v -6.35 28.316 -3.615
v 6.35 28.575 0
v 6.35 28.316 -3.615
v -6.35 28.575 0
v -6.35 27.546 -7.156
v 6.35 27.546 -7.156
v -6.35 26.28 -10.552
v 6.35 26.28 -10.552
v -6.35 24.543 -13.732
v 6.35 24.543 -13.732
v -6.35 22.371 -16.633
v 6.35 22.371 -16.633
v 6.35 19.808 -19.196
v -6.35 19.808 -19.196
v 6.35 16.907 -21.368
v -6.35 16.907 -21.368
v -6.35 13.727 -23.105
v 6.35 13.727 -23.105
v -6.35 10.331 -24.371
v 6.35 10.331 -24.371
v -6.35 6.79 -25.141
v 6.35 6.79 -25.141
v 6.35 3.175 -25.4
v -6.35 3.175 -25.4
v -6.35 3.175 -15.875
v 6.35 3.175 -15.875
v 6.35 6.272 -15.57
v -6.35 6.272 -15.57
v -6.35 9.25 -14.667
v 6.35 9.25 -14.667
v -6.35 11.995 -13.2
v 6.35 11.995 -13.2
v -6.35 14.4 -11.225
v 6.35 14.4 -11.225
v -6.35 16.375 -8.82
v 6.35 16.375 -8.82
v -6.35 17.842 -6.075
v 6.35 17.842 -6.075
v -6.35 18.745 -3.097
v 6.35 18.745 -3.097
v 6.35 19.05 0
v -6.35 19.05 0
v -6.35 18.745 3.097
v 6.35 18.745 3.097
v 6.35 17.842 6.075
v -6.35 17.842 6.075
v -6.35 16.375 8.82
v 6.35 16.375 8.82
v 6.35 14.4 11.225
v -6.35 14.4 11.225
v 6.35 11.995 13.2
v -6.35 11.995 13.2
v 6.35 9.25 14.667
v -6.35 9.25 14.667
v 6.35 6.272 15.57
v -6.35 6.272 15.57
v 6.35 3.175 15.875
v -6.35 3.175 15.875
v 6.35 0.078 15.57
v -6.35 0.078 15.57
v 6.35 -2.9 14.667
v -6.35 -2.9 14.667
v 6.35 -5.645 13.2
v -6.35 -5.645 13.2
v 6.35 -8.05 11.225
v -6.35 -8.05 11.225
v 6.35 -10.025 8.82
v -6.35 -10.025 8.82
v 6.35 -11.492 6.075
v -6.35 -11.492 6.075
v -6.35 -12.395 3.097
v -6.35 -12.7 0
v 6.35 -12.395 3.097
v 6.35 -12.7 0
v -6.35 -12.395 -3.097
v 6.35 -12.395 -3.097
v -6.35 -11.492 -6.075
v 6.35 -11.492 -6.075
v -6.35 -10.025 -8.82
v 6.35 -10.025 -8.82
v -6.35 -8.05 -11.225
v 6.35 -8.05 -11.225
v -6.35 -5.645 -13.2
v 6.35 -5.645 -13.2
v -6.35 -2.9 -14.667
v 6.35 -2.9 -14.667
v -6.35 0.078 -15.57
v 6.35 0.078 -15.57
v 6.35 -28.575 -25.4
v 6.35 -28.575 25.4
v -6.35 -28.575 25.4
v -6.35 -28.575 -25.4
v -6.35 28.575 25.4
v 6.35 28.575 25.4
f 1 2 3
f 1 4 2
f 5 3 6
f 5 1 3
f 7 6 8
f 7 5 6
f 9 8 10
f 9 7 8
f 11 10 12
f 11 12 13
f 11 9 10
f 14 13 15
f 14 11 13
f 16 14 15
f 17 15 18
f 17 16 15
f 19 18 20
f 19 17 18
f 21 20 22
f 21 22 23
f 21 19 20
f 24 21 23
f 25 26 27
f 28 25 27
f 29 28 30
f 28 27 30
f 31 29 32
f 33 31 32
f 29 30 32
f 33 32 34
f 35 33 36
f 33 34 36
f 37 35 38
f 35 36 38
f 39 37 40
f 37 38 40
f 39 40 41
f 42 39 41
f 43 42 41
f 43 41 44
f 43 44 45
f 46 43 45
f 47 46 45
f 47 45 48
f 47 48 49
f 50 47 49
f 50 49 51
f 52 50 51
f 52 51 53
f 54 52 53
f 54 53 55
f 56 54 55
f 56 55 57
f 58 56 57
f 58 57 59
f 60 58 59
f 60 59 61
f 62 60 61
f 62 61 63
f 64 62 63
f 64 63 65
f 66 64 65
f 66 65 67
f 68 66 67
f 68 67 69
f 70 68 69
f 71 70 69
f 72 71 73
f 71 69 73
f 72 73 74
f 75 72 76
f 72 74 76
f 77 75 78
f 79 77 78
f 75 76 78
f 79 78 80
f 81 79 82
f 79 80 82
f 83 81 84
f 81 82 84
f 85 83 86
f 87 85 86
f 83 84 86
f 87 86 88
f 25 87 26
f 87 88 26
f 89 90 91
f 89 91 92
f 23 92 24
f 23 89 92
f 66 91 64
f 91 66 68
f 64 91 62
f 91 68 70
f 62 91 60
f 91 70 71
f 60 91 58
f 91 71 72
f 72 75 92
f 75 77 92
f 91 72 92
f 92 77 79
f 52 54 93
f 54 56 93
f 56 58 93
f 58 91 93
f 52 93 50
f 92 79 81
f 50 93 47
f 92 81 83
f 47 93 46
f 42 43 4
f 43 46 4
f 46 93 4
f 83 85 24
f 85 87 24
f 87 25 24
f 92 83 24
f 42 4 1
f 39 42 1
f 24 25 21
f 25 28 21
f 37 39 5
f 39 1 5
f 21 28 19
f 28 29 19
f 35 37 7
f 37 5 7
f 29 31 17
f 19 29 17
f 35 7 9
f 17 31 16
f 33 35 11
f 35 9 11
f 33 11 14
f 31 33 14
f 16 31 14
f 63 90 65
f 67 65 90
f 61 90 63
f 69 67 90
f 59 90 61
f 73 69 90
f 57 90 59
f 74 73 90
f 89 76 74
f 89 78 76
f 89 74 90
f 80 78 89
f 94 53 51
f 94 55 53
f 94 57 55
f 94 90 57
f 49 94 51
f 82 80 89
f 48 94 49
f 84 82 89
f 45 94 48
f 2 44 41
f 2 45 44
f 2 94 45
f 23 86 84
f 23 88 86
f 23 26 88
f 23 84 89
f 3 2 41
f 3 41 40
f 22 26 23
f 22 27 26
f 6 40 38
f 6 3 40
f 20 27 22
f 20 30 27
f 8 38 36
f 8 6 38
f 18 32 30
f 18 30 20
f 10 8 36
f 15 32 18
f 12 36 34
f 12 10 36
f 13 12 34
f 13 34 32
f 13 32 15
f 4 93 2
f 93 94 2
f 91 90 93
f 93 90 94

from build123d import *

# Parameters (mm, degrees)
SKETCH1_W           = 50.8
SKETCH1_H           = 57.15
BOSS_EXTRUDE1_DEPTH = 6.35
CUT_EXTRUDE1_REACH  = 14.7
SKETCH2_R           = 15.875
FILLET1_R           = 25.4


with BuildPart() as part:
    # Sketch1 → Boss-Extrude1 (new body, symmetric)
    with BuildSketch(Plane(origin=(0, 0, 0), x_dir=(0, 0, -1), z_dir=(1, 0, 0))):
        Rectangle(SKETCH1_W, SKETCH1_H)
    extrude(amount=BOSS_EXTRUDE1_DEPTH, both=True)

    # Sketch2 → Cut-Extrude1 (cut, up to next)
    with BuildSketch(Plane(origin=(6.35, 0, 0), x_dir=(0, 0, -1), z_dir=(1, 0, 0)), mode=Mode.PRIVATE) as cut_extrude1_sk1:
        with Locations((0, 3.175)):
            Circle(SKETCH2_R)
    cut_extrude1_tool1 = extrude(cut_extrude1_sk1.sketch, amount=-CUT_EXTRUDE1_REACH, mode=Mode.PRIVATE) & part.part
    add(cut_extrude1_tool1.solids().sort_by_distance((6.35, 3.175, 0))[0], mode=Mode.SUBTRACT)

    # Fillet1
    fillet1_edges = [part.edges().sort_by_distance(p)[0] for p in [
        (0, 28.575, -25.4),
    ]]
    fillet(fillet1_edges, radius=FILLET1_R)


solid = part.part
